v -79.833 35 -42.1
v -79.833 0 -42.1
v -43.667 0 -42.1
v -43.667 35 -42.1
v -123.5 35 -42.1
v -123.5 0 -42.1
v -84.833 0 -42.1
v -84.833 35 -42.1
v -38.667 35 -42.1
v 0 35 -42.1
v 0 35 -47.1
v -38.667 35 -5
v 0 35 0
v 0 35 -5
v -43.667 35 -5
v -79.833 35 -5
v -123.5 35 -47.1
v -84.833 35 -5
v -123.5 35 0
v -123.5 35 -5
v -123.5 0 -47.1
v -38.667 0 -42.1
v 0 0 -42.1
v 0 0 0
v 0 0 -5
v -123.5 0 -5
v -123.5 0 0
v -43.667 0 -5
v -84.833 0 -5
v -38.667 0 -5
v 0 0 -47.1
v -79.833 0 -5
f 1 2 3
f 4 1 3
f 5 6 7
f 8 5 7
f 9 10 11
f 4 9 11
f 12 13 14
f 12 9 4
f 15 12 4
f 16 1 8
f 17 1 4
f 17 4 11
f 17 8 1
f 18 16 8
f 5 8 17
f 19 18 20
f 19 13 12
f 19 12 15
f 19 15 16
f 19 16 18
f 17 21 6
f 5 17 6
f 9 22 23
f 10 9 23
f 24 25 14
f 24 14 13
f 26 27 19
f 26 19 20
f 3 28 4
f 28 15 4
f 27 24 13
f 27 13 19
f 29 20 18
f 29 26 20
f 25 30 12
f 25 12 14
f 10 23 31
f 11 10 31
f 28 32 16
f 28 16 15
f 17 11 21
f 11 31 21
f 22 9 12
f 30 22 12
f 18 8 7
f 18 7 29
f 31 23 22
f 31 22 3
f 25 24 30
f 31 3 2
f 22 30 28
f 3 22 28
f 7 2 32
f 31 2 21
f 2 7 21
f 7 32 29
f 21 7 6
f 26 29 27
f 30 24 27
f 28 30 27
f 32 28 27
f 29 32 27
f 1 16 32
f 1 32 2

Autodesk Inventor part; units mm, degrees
ref_plane "YZ Plane" through (0, 0, 0) normal (1, 0, 0) x (0, 1, 0)
ref_plane "XZ Plane" through (0, 0, 0) normal (0, 1, 0) x (-1, 0, 0)
ref_plane "XY Plane" through (0, 0, 0) normal (0, 0, 1) x (1, 0, 0)
sketch "Sketch1" plane through (0, 0, 0) normal (0, 1, 0) x (-1, 0, 0)
  line L0 (0, 0) -> (123.5, 0)
  line L1 (123.5, 0) -> (123.5, -5)
  line L2 (123.5, -5) -> (0, -5)
  line L3 (0, -5) -> (0, 0)
  line L4 (0, -47.1) -> (123.5, -47.1)
  line L5 (123.5, -47.1) -> (123.5, -42.1)
  line L6 (123.5, -42.1) -> (0, -42.1)
  line L7 (0, -42.1) -> (0, -47.1)
  dimension "d0" = 123.5
  dimension "d1" = 5
  dimension "d2" = 123.5
  dimension "d3" = 5
  dimension "d4" = 47.1
  dimension "d7" = 0
extrude "Extrusion1" add sketch "Sketch1" along normal blind 35
sketch "Sketch2" plane through (0, 35, 0) normal (0, 1, 0) x (1, 0, 0)
  line L0 (-123.5, 0) -> (0, 0) projected
  line L1 (0, 0) -> (0, 5) projected
  line L2 (0, 5) -> (-123.5, 5) projected
  line L3 (-123.5, 5) -> (-123.5, 0) projected
  line L4 (0, 47.1) -> (-123.5, 47.1) projected
  line L5 (-123.5, 47.1) -> (-123.5, 42.1) projected
  line L6 (-123.5, 42.1) -> (0, 42.1) projected
  line L7 (0, 42.1) -> (0, 47.1) projected
  line L8 (-38.6667, 5) -> (-43.6667, 5)
  line L9 (-43.6667, 5) -> (-43.6667, 42.1)
  line L10 (-43.6667, 42.1) -> (-38.6667, 42.1)
  line L11 (-38.6667, 42.1) -> (-38.6667, 5)
  line L12 (-123.5, 42.1) -> (0, 42.1) projected
  line L13 (-84.8333, 5) -> (-79.8333, 5)
  line L14 (-79.8333, 5) -> (-79.8333, 42.1)
  line L15 (-79.8333, 42.1) -> (-84.8333, 42.1)
  line L16 (-84.8333, 42.1) -> (-84.8333, 5)
  dimension "d8" = 5
  dimension "d9" = 5
  dimension "d10" = 38.6667
  dimension "d11" = 38.6667
extrude "Extrusion2" add sketch "Sketch2" against normal blind 35 contours L16 L6 L14 L2 | L2 L9 L6 L11
properties part number "Parametric"
